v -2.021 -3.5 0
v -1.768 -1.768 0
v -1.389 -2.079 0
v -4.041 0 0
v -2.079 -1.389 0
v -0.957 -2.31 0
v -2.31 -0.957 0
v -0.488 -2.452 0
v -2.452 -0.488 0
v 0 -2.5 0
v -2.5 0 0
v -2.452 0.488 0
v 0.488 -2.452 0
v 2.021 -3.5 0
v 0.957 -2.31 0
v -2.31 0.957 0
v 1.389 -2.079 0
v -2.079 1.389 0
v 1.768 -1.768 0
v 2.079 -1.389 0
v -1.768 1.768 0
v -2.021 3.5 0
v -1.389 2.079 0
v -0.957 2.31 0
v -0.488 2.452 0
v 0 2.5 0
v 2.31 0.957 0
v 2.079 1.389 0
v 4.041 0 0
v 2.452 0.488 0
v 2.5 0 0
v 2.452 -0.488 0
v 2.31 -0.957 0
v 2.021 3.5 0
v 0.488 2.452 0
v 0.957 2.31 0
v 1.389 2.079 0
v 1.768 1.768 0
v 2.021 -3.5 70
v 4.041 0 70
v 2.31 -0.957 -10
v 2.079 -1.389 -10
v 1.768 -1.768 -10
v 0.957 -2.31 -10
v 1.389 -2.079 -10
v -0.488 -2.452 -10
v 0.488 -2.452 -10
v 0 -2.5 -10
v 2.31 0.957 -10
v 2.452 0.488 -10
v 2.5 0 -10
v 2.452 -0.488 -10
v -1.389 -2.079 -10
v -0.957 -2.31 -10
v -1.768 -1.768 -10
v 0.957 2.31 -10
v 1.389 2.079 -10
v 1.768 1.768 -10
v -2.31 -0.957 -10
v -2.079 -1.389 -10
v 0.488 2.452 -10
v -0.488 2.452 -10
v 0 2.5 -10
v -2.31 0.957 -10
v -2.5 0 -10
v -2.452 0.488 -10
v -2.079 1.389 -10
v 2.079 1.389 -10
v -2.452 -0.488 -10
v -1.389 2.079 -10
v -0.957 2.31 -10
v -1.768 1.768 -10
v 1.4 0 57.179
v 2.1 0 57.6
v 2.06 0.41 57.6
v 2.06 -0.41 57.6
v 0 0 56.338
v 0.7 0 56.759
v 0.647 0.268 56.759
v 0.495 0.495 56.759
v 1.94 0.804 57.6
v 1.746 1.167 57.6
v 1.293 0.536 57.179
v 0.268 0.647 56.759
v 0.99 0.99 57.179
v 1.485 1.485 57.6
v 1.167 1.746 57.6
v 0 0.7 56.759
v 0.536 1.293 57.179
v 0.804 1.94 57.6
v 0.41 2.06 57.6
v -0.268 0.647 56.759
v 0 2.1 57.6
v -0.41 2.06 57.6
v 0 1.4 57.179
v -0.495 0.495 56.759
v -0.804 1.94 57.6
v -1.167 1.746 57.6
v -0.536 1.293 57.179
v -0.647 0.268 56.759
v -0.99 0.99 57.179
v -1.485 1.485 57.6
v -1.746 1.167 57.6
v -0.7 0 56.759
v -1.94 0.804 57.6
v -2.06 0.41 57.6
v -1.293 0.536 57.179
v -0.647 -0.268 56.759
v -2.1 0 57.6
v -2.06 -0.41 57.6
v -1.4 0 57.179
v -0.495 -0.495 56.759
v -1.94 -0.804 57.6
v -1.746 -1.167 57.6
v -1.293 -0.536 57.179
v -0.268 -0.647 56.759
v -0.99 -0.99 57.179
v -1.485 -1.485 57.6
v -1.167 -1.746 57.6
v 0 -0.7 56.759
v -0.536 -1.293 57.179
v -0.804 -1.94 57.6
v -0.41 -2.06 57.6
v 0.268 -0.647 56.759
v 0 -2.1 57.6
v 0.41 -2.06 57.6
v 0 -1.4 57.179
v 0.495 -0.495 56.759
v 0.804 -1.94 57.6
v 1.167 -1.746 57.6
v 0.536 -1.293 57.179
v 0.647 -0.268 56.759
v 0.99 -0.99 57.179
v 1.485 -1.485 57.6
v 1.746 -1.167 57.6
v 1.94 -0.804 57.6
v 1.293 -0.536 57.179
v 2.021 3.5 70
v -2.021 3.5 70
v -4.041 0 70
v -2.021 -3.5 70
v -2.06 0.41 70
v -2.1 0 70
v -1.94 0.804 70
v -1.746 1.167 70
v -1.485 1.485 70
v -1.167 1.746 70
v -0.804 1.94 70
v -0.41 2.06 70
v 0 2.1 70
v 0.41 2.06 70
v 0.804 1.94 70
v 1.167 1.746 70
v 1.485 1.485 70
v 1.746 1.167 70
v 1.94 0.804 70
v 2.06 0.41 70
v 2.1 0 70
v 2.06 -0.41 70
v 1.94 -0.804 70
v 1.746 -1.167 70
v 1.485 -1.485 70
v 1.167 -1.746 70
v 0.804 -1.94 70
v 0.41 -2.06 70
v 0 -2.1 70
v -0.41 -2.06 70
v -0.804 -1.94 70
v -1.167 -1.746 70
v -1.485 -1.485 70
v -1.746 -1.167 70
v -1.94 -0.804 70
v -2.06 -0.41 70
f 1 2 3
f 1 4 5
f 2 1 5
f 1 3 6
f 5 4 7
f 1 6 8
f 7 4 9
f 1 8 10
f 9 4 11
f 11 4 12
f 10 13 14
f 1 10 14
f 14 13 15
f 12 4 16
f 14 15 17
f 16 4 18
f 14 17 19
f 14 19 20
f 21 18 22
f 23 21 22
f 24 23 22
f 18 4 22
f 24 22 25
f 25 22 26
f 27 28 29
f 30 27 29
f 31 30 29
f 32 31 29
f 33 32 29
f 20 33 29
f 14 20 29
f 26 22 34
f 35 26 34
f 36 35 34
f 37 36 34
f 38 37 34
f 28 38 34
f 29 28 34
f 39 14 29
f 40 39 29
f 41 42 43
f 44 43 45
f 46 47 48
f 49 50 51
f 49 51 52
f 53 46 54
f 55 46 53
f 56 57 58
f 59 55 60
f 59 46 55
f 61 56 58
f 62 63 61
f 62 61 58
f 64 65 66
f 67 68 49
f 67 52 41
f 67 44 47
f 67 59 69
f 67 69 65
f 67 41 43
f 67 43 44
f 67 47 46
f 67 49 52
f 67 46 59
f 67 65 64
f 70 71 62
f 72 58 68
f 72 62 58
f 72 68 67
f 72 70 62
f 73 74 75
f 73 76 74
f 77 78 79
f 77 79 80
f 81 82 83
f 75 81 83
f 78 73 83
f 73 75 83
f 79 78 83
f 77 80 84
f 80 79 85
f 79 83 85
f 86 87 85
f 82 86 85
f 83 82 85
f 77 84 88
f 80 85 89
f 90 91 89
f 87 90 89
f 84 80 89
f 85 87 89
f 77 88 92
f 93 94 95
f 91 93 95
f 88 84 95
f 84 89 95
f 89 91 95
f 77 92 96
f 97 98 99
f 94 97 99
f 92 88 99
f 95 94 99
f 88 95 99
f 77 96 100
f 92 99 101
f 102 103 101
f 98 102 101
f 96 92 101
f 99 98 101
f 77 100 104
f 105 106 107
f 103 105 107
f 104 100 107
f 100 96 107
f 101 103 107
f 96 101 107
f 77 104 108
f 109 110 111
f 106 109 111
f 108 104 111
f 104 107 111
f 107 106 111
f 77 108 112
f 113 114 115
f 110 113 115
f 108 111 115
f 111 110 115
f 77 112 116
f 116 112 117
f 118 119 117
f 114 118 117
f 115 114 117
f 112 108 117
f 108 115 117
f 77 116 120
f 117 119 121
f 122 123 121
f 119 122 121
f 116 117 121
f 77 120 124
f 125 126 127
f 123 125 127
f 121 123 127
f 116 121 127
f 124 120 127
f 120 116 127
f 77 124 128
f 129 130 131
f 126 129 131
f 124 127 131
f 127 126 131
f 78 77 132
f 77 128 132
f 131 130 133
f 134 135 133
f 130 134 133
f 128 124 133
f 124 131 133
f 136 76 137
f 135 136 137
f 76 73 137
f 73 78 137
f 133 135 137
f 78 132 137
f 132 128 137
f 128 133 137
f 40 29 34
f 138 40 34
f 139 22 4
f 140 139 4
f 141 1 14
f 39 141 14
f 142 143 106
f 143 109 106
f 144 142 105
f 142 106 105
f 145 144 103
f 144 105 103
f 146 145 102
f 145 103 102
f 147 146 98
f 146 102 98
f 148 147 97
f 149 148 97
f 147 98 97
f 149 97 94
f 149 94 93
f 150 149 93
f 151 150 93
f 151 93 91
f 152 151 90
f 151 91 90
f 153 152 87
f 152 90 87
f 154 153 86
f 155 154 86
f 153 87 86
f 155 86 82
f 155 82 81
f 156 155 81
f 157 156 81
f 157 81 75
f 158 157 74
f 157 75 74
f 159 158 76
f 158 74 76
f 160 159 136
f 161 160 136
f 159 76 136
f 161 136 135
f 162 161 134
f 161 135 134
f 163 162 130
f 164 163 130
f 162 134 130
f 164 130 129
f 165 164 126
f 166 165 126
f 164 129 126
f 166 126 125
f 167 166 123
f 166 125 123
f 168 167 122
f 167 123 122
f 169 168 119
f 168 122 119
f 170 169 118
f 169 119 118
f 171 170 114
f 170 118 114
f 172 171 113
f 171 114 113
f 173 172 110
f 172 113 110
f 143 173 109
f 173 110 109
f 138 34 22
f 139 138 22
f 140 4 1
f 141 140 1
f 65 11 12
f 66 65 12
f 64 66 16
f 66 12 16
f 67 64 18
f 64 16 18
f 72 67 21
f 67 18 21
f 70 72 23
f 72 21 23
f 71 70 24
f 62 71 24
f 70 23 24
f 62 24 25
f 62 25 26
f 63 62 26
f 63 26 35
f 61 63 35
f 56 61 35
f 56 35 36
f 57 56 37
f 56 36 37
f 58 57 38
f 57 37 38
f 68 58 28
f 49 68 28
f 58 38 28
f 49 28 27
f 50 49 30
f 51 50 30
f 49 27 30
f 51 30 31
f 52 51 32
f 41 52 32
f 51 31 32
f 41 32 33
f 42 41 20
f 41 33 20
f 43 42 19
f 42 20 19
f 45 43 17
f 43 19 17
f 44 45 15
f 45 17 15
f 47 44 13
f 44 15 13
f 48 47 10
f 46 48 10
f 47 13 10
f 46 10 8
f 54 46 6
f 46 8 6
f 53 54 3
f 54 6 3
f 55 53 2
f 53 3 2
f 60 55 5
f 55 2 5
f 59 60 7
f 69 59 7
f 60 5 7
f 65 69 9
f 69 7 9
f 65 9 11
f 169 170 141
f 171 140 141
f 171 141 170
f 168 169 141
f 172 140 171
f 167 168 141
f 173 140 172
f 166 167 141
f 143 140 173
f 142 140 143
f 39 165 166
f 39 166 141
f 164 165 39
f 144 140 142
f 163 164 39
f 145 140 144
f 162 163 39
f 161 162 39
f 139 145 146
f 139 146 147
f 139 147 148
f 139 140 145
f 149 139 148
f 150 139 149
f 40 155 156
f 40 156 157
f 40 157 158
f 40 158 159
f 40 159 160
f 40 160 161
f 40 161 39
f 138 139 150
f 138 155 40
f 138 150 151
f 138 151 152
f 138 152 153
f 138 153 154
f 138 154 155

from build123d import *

# Parameters (mm, degrees)
EXTRUDE_1_DEPTH           = 70
SKETCH_4_R                = 2.5
EXTRUDE_2_DEPTH           = 10
M5X0_8_TAPPED_HOLE1_D     = 4.2
M5X0_8_TAPPED_HOLE1_DEPTH = 12.4
M5X0_8_TAPPED_HOLE1_TIP   = 1.2618073


with BuildPart() as part:
    # 草圖1 → 填料-伸長1 (new body)
    with BuildSketch(Plane.XY):
        Polygon((-2.020725942, 3.5), (-4.041451884, 0), (-2.020725942, -3.5), (2.020725942, -3.5), (4.041451884, 0), (2.020725942, 3.5), align=None)
    extrude(amount=EXTRUDE_1_DEPTH)

    # 草圖4 → 填料-伸長2 (add)
    with BuildSketch(Plane(origin=(0, 0, 0), x_dir=(-1, 0, 0), z_dir=(0, 0, -1))):
        Circle(SKETCH_4_R)
    extrude(amount=EXTRUDE_2_DEPTH)

    # M5x0.8 Tapped Hole1
    with Locations(Plane.XY.offset(70)):
        with Locations((0, 0)):
            Hole(M5X0_8_TAPPED_HOLE1_D / 2, depth=M5X0_8_TAPPED_HOLE1_DEPTH)
            with Locations((0, 0, -(M5X0_8_TAPPED_HOLE1_DEPTH + M5X0_8_TAPPED_HOLE1_TIP / 2))):  # 118° drill point
                Cone(0, M5X0_8_TAPPED_HOLE1_D / 2, M5X0_8_TAPPED_HOLE1_TIP, mode=Mode.SUBTRACT)


solid = part.part
